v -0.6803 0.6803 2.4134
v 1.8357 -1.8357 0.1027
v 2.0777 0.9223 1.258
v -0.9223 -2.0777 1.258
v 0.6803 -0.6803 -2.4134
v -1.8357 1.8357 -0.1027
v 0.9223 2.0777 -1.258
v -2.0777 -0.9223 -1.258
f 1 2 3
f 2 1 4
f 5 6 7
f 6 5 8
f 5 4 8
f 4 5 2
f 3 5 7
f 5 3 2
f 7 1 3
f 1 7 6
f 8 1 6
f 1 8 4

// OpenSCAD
// rotation around an arbitrary axis
rotate(a = 33, v = [1, 1, 0]) cube(3, center = true);
